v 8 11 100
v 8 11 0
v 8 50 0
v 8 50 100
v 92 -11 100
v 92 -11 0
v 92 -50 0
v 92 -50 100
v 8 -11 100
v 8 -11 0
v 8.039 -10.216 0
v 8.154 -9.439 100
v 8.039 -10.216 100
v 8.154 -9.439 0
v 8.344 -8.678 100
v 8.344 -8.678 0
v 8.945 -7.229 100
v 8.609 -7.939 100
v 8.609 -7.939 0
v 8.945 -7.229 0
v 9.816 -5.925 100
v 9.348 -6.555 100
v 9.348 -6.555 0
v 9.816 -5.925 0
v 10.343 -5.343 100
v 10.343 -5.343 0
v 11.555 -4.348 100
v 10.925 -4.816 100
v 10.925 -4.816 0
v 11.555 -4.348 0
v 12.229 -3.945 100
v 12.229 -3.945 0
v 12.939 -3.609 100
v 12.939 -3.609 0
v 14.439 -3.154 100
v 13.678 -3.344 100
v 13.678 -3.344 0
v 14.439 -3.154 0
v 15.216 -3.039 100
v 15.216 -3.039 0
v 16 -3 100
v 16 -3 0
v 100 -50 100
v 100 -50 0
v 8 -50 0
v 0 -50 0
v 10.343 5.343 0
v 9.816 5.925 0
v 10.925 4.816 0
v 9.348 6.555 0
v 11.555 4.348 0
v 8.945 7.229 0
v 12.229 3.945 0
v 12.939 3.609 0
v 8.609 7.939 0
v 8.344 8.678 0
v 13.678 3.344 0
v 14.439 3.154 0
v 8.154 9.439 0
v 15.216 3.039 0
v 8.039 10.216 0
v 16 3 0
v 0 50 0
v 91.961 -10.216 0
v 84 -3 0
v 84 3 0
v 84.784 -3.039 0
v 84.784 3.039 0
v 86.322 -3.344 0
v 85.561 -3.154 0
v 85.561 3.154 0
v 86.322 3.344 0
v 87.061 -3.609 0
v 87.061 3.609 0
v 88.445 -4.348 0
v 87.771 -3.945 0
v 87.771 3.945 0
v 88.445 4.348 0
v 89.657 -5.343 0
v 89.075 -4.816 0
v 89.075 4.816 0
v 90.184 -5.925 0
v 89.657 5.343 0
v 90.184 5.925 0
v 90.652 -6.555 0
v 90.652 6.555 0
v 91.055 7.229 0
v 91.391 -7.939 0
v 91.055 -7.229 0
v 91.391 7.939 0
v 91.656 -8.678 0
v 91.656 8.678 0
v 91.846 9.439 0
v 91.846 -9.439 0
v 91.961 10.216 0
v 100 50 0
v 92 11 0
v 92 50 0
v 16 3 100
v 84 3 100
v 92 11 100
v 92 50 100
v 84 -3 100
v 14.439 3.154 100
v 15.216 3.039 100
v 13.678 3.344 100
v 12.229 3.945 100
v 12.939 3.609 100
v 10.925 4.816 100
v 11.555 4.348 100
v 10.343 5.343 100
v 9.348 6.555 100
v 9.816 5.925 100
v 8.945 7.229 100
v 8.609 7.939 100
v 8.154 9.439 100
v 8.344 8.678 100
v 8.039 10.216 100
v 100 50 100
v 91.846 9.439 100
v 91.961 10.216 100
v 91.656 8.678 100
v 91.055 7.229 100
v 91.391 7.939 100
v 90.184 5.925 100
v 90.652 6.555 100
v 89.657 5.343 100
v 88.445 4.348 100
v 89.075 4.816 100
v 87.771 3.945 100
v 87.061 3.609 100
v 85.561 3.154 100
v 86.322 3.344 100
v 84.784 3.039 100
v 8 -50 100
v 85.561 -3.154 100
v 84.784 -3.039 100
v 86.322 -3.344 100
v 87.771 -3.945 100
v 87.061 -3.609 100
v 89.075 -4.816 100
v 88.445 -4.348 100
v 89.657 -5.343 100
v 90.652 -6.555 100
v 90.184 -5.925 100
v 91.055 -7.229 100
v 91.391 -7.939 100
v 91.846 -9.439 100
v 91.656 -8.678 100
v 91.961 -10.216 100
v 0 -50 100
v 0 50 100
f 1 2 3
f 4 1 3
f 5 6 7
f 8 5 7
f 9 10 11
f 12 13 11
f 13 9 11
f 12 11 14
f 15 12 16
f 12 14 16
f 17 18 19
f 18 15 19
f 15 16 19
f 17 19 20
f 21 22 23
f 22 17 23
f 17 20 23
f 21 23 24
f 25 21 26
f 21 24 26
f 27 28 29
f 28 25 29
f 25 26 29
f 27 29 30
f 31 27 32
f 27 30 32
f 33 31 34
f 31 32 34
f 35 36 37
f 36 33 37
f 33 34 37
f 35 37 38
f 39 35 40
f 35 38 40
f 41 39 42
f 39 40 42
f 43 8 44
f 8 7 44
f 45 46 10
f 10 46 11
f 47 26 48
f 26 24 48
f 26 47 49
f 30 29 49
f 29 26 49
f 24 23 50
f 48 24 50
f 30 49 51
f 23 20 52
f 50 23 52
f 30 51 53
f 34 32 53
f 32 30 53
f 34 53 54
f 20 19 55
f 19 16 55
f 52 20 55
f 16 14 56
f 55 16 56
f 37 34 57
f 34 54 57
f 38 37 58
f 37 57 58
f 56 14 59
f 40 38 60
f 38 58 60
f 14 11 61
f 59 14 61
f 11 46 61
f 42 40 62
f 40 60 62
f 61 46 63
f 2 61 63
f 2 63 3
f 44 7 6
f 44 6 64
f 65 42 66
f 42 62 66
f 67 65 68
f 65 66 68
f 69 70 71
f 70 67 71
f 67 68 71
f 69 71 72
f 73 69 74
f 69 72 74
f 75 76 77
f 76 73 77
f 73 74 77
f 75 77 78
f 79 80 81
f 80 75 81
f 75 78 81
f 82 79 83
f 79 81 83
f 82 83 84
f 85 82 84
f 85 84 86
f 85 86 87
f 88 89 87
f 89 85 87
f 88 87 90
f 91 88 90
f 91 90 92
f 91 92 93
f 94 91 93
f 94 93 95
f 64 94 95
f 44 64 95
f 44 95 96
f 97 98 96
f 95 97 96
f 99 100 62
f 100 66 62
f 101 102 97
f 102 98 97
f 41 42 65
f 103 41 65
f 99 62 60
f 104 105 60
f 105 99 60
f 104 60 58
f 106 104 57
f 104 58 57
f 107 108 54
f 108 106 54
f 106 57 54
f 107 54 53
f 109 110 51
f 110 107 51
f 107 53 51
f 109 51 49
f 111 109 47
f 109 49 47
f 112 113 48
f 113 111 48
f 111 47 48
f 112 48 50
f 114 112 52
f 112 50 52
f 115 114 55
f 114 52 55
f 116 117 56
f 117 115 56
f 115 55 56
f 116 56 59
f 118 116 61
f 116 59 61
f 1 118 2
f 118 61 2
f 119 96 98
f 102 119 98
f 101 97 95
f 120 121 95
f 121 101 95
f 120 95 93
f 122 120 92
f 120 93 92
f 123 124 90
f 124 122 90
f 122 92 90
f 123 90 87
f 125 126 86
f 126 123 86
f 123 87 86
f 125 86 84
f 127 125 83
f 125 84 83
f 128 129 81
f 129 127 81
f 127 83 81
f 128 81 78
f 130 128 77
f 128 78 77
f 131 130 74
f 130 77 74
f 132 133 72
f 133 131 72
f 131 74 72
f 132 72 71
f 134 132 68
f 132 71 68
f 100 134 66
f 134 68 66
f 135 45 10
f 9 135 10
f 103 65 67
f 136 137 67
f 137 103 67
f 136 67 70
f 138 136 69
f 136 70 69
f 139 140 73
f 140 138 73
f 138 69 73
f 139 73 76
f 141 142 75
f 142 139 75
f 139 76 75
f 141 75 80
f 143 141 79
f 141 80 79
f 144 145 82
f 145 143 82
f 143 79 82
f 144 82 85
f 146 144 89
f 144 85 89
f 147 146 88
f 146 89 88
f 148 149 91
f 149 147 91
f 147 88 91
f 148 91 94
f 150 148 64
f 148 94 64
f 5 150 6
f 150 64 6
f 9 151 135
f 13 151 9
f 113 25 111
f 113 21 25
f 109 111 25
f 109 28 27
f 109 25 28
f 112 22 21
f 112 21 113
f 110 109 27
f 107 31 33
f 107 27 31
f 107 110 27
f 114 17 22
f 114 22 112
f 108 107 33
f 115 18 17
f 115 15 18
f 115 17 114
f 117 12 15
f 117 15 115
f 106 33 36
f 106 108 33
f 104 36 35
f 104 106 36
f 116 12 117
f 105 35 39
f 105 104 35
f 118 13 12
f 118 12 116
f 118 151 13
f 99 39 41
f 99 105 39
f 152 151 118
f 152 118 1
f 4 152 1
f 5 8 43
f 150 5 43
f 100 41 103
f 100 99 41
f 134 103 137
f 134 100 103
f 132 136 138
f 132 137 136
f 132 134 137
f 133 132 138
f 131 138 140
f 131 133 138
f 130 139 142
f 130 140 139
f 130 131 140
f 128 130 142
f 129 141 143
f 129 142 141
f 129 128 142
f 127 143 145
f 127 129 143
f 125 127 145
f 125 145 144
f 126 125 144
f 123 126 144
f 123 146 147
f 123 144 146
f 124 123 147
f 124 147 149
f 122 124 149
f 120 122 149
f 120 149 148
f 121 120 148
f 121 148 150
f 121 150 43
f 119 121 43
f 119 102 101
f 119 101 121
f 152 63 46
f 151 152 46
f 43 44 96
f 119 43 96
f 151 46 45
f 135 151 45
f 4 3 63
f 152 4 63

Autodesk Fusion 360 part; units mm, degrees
sketch "スケッチ1" plane through (0, 0, 0) normal (0, 0, 1) x (1, 0, 0)
  line L0 (0, 50) -> (0, -50)
  line L1 (100, -50) -> (100, 50)
  line L2 (8, -50) -> (8, -11)
  line L3 (0, -50) -> (8, -50)
  line L4 (92, -11) -> (92, -50)
  line L5 (92, -50) -> (100, -50)
  line L6 (84, 3) -> (16, 3)
  line L7 (16, -3) -> (84, -3)
  line L8 (8, 11) -> (8, 50)
  line L9 (8, 50) -> (0, 50)
  line L10 (92, 50) -> (92, 11)
  line L11 (100, 50) -> (92, 50)
  arc A0 (16, -3) -> (8, -11) centre (16, -11) ccw
  arc A1 (8, 11) -> (16, 3) centre (16, 11) ccw
  arc A2 (84, 3) -> (92, 11) centre (84, 11) ccw
  arc A3 (92, -11) -> (84, -3) centre (84, -11) ccw
extrude "押し出し1" add sketch "スケッチ1" along normal blind 100
